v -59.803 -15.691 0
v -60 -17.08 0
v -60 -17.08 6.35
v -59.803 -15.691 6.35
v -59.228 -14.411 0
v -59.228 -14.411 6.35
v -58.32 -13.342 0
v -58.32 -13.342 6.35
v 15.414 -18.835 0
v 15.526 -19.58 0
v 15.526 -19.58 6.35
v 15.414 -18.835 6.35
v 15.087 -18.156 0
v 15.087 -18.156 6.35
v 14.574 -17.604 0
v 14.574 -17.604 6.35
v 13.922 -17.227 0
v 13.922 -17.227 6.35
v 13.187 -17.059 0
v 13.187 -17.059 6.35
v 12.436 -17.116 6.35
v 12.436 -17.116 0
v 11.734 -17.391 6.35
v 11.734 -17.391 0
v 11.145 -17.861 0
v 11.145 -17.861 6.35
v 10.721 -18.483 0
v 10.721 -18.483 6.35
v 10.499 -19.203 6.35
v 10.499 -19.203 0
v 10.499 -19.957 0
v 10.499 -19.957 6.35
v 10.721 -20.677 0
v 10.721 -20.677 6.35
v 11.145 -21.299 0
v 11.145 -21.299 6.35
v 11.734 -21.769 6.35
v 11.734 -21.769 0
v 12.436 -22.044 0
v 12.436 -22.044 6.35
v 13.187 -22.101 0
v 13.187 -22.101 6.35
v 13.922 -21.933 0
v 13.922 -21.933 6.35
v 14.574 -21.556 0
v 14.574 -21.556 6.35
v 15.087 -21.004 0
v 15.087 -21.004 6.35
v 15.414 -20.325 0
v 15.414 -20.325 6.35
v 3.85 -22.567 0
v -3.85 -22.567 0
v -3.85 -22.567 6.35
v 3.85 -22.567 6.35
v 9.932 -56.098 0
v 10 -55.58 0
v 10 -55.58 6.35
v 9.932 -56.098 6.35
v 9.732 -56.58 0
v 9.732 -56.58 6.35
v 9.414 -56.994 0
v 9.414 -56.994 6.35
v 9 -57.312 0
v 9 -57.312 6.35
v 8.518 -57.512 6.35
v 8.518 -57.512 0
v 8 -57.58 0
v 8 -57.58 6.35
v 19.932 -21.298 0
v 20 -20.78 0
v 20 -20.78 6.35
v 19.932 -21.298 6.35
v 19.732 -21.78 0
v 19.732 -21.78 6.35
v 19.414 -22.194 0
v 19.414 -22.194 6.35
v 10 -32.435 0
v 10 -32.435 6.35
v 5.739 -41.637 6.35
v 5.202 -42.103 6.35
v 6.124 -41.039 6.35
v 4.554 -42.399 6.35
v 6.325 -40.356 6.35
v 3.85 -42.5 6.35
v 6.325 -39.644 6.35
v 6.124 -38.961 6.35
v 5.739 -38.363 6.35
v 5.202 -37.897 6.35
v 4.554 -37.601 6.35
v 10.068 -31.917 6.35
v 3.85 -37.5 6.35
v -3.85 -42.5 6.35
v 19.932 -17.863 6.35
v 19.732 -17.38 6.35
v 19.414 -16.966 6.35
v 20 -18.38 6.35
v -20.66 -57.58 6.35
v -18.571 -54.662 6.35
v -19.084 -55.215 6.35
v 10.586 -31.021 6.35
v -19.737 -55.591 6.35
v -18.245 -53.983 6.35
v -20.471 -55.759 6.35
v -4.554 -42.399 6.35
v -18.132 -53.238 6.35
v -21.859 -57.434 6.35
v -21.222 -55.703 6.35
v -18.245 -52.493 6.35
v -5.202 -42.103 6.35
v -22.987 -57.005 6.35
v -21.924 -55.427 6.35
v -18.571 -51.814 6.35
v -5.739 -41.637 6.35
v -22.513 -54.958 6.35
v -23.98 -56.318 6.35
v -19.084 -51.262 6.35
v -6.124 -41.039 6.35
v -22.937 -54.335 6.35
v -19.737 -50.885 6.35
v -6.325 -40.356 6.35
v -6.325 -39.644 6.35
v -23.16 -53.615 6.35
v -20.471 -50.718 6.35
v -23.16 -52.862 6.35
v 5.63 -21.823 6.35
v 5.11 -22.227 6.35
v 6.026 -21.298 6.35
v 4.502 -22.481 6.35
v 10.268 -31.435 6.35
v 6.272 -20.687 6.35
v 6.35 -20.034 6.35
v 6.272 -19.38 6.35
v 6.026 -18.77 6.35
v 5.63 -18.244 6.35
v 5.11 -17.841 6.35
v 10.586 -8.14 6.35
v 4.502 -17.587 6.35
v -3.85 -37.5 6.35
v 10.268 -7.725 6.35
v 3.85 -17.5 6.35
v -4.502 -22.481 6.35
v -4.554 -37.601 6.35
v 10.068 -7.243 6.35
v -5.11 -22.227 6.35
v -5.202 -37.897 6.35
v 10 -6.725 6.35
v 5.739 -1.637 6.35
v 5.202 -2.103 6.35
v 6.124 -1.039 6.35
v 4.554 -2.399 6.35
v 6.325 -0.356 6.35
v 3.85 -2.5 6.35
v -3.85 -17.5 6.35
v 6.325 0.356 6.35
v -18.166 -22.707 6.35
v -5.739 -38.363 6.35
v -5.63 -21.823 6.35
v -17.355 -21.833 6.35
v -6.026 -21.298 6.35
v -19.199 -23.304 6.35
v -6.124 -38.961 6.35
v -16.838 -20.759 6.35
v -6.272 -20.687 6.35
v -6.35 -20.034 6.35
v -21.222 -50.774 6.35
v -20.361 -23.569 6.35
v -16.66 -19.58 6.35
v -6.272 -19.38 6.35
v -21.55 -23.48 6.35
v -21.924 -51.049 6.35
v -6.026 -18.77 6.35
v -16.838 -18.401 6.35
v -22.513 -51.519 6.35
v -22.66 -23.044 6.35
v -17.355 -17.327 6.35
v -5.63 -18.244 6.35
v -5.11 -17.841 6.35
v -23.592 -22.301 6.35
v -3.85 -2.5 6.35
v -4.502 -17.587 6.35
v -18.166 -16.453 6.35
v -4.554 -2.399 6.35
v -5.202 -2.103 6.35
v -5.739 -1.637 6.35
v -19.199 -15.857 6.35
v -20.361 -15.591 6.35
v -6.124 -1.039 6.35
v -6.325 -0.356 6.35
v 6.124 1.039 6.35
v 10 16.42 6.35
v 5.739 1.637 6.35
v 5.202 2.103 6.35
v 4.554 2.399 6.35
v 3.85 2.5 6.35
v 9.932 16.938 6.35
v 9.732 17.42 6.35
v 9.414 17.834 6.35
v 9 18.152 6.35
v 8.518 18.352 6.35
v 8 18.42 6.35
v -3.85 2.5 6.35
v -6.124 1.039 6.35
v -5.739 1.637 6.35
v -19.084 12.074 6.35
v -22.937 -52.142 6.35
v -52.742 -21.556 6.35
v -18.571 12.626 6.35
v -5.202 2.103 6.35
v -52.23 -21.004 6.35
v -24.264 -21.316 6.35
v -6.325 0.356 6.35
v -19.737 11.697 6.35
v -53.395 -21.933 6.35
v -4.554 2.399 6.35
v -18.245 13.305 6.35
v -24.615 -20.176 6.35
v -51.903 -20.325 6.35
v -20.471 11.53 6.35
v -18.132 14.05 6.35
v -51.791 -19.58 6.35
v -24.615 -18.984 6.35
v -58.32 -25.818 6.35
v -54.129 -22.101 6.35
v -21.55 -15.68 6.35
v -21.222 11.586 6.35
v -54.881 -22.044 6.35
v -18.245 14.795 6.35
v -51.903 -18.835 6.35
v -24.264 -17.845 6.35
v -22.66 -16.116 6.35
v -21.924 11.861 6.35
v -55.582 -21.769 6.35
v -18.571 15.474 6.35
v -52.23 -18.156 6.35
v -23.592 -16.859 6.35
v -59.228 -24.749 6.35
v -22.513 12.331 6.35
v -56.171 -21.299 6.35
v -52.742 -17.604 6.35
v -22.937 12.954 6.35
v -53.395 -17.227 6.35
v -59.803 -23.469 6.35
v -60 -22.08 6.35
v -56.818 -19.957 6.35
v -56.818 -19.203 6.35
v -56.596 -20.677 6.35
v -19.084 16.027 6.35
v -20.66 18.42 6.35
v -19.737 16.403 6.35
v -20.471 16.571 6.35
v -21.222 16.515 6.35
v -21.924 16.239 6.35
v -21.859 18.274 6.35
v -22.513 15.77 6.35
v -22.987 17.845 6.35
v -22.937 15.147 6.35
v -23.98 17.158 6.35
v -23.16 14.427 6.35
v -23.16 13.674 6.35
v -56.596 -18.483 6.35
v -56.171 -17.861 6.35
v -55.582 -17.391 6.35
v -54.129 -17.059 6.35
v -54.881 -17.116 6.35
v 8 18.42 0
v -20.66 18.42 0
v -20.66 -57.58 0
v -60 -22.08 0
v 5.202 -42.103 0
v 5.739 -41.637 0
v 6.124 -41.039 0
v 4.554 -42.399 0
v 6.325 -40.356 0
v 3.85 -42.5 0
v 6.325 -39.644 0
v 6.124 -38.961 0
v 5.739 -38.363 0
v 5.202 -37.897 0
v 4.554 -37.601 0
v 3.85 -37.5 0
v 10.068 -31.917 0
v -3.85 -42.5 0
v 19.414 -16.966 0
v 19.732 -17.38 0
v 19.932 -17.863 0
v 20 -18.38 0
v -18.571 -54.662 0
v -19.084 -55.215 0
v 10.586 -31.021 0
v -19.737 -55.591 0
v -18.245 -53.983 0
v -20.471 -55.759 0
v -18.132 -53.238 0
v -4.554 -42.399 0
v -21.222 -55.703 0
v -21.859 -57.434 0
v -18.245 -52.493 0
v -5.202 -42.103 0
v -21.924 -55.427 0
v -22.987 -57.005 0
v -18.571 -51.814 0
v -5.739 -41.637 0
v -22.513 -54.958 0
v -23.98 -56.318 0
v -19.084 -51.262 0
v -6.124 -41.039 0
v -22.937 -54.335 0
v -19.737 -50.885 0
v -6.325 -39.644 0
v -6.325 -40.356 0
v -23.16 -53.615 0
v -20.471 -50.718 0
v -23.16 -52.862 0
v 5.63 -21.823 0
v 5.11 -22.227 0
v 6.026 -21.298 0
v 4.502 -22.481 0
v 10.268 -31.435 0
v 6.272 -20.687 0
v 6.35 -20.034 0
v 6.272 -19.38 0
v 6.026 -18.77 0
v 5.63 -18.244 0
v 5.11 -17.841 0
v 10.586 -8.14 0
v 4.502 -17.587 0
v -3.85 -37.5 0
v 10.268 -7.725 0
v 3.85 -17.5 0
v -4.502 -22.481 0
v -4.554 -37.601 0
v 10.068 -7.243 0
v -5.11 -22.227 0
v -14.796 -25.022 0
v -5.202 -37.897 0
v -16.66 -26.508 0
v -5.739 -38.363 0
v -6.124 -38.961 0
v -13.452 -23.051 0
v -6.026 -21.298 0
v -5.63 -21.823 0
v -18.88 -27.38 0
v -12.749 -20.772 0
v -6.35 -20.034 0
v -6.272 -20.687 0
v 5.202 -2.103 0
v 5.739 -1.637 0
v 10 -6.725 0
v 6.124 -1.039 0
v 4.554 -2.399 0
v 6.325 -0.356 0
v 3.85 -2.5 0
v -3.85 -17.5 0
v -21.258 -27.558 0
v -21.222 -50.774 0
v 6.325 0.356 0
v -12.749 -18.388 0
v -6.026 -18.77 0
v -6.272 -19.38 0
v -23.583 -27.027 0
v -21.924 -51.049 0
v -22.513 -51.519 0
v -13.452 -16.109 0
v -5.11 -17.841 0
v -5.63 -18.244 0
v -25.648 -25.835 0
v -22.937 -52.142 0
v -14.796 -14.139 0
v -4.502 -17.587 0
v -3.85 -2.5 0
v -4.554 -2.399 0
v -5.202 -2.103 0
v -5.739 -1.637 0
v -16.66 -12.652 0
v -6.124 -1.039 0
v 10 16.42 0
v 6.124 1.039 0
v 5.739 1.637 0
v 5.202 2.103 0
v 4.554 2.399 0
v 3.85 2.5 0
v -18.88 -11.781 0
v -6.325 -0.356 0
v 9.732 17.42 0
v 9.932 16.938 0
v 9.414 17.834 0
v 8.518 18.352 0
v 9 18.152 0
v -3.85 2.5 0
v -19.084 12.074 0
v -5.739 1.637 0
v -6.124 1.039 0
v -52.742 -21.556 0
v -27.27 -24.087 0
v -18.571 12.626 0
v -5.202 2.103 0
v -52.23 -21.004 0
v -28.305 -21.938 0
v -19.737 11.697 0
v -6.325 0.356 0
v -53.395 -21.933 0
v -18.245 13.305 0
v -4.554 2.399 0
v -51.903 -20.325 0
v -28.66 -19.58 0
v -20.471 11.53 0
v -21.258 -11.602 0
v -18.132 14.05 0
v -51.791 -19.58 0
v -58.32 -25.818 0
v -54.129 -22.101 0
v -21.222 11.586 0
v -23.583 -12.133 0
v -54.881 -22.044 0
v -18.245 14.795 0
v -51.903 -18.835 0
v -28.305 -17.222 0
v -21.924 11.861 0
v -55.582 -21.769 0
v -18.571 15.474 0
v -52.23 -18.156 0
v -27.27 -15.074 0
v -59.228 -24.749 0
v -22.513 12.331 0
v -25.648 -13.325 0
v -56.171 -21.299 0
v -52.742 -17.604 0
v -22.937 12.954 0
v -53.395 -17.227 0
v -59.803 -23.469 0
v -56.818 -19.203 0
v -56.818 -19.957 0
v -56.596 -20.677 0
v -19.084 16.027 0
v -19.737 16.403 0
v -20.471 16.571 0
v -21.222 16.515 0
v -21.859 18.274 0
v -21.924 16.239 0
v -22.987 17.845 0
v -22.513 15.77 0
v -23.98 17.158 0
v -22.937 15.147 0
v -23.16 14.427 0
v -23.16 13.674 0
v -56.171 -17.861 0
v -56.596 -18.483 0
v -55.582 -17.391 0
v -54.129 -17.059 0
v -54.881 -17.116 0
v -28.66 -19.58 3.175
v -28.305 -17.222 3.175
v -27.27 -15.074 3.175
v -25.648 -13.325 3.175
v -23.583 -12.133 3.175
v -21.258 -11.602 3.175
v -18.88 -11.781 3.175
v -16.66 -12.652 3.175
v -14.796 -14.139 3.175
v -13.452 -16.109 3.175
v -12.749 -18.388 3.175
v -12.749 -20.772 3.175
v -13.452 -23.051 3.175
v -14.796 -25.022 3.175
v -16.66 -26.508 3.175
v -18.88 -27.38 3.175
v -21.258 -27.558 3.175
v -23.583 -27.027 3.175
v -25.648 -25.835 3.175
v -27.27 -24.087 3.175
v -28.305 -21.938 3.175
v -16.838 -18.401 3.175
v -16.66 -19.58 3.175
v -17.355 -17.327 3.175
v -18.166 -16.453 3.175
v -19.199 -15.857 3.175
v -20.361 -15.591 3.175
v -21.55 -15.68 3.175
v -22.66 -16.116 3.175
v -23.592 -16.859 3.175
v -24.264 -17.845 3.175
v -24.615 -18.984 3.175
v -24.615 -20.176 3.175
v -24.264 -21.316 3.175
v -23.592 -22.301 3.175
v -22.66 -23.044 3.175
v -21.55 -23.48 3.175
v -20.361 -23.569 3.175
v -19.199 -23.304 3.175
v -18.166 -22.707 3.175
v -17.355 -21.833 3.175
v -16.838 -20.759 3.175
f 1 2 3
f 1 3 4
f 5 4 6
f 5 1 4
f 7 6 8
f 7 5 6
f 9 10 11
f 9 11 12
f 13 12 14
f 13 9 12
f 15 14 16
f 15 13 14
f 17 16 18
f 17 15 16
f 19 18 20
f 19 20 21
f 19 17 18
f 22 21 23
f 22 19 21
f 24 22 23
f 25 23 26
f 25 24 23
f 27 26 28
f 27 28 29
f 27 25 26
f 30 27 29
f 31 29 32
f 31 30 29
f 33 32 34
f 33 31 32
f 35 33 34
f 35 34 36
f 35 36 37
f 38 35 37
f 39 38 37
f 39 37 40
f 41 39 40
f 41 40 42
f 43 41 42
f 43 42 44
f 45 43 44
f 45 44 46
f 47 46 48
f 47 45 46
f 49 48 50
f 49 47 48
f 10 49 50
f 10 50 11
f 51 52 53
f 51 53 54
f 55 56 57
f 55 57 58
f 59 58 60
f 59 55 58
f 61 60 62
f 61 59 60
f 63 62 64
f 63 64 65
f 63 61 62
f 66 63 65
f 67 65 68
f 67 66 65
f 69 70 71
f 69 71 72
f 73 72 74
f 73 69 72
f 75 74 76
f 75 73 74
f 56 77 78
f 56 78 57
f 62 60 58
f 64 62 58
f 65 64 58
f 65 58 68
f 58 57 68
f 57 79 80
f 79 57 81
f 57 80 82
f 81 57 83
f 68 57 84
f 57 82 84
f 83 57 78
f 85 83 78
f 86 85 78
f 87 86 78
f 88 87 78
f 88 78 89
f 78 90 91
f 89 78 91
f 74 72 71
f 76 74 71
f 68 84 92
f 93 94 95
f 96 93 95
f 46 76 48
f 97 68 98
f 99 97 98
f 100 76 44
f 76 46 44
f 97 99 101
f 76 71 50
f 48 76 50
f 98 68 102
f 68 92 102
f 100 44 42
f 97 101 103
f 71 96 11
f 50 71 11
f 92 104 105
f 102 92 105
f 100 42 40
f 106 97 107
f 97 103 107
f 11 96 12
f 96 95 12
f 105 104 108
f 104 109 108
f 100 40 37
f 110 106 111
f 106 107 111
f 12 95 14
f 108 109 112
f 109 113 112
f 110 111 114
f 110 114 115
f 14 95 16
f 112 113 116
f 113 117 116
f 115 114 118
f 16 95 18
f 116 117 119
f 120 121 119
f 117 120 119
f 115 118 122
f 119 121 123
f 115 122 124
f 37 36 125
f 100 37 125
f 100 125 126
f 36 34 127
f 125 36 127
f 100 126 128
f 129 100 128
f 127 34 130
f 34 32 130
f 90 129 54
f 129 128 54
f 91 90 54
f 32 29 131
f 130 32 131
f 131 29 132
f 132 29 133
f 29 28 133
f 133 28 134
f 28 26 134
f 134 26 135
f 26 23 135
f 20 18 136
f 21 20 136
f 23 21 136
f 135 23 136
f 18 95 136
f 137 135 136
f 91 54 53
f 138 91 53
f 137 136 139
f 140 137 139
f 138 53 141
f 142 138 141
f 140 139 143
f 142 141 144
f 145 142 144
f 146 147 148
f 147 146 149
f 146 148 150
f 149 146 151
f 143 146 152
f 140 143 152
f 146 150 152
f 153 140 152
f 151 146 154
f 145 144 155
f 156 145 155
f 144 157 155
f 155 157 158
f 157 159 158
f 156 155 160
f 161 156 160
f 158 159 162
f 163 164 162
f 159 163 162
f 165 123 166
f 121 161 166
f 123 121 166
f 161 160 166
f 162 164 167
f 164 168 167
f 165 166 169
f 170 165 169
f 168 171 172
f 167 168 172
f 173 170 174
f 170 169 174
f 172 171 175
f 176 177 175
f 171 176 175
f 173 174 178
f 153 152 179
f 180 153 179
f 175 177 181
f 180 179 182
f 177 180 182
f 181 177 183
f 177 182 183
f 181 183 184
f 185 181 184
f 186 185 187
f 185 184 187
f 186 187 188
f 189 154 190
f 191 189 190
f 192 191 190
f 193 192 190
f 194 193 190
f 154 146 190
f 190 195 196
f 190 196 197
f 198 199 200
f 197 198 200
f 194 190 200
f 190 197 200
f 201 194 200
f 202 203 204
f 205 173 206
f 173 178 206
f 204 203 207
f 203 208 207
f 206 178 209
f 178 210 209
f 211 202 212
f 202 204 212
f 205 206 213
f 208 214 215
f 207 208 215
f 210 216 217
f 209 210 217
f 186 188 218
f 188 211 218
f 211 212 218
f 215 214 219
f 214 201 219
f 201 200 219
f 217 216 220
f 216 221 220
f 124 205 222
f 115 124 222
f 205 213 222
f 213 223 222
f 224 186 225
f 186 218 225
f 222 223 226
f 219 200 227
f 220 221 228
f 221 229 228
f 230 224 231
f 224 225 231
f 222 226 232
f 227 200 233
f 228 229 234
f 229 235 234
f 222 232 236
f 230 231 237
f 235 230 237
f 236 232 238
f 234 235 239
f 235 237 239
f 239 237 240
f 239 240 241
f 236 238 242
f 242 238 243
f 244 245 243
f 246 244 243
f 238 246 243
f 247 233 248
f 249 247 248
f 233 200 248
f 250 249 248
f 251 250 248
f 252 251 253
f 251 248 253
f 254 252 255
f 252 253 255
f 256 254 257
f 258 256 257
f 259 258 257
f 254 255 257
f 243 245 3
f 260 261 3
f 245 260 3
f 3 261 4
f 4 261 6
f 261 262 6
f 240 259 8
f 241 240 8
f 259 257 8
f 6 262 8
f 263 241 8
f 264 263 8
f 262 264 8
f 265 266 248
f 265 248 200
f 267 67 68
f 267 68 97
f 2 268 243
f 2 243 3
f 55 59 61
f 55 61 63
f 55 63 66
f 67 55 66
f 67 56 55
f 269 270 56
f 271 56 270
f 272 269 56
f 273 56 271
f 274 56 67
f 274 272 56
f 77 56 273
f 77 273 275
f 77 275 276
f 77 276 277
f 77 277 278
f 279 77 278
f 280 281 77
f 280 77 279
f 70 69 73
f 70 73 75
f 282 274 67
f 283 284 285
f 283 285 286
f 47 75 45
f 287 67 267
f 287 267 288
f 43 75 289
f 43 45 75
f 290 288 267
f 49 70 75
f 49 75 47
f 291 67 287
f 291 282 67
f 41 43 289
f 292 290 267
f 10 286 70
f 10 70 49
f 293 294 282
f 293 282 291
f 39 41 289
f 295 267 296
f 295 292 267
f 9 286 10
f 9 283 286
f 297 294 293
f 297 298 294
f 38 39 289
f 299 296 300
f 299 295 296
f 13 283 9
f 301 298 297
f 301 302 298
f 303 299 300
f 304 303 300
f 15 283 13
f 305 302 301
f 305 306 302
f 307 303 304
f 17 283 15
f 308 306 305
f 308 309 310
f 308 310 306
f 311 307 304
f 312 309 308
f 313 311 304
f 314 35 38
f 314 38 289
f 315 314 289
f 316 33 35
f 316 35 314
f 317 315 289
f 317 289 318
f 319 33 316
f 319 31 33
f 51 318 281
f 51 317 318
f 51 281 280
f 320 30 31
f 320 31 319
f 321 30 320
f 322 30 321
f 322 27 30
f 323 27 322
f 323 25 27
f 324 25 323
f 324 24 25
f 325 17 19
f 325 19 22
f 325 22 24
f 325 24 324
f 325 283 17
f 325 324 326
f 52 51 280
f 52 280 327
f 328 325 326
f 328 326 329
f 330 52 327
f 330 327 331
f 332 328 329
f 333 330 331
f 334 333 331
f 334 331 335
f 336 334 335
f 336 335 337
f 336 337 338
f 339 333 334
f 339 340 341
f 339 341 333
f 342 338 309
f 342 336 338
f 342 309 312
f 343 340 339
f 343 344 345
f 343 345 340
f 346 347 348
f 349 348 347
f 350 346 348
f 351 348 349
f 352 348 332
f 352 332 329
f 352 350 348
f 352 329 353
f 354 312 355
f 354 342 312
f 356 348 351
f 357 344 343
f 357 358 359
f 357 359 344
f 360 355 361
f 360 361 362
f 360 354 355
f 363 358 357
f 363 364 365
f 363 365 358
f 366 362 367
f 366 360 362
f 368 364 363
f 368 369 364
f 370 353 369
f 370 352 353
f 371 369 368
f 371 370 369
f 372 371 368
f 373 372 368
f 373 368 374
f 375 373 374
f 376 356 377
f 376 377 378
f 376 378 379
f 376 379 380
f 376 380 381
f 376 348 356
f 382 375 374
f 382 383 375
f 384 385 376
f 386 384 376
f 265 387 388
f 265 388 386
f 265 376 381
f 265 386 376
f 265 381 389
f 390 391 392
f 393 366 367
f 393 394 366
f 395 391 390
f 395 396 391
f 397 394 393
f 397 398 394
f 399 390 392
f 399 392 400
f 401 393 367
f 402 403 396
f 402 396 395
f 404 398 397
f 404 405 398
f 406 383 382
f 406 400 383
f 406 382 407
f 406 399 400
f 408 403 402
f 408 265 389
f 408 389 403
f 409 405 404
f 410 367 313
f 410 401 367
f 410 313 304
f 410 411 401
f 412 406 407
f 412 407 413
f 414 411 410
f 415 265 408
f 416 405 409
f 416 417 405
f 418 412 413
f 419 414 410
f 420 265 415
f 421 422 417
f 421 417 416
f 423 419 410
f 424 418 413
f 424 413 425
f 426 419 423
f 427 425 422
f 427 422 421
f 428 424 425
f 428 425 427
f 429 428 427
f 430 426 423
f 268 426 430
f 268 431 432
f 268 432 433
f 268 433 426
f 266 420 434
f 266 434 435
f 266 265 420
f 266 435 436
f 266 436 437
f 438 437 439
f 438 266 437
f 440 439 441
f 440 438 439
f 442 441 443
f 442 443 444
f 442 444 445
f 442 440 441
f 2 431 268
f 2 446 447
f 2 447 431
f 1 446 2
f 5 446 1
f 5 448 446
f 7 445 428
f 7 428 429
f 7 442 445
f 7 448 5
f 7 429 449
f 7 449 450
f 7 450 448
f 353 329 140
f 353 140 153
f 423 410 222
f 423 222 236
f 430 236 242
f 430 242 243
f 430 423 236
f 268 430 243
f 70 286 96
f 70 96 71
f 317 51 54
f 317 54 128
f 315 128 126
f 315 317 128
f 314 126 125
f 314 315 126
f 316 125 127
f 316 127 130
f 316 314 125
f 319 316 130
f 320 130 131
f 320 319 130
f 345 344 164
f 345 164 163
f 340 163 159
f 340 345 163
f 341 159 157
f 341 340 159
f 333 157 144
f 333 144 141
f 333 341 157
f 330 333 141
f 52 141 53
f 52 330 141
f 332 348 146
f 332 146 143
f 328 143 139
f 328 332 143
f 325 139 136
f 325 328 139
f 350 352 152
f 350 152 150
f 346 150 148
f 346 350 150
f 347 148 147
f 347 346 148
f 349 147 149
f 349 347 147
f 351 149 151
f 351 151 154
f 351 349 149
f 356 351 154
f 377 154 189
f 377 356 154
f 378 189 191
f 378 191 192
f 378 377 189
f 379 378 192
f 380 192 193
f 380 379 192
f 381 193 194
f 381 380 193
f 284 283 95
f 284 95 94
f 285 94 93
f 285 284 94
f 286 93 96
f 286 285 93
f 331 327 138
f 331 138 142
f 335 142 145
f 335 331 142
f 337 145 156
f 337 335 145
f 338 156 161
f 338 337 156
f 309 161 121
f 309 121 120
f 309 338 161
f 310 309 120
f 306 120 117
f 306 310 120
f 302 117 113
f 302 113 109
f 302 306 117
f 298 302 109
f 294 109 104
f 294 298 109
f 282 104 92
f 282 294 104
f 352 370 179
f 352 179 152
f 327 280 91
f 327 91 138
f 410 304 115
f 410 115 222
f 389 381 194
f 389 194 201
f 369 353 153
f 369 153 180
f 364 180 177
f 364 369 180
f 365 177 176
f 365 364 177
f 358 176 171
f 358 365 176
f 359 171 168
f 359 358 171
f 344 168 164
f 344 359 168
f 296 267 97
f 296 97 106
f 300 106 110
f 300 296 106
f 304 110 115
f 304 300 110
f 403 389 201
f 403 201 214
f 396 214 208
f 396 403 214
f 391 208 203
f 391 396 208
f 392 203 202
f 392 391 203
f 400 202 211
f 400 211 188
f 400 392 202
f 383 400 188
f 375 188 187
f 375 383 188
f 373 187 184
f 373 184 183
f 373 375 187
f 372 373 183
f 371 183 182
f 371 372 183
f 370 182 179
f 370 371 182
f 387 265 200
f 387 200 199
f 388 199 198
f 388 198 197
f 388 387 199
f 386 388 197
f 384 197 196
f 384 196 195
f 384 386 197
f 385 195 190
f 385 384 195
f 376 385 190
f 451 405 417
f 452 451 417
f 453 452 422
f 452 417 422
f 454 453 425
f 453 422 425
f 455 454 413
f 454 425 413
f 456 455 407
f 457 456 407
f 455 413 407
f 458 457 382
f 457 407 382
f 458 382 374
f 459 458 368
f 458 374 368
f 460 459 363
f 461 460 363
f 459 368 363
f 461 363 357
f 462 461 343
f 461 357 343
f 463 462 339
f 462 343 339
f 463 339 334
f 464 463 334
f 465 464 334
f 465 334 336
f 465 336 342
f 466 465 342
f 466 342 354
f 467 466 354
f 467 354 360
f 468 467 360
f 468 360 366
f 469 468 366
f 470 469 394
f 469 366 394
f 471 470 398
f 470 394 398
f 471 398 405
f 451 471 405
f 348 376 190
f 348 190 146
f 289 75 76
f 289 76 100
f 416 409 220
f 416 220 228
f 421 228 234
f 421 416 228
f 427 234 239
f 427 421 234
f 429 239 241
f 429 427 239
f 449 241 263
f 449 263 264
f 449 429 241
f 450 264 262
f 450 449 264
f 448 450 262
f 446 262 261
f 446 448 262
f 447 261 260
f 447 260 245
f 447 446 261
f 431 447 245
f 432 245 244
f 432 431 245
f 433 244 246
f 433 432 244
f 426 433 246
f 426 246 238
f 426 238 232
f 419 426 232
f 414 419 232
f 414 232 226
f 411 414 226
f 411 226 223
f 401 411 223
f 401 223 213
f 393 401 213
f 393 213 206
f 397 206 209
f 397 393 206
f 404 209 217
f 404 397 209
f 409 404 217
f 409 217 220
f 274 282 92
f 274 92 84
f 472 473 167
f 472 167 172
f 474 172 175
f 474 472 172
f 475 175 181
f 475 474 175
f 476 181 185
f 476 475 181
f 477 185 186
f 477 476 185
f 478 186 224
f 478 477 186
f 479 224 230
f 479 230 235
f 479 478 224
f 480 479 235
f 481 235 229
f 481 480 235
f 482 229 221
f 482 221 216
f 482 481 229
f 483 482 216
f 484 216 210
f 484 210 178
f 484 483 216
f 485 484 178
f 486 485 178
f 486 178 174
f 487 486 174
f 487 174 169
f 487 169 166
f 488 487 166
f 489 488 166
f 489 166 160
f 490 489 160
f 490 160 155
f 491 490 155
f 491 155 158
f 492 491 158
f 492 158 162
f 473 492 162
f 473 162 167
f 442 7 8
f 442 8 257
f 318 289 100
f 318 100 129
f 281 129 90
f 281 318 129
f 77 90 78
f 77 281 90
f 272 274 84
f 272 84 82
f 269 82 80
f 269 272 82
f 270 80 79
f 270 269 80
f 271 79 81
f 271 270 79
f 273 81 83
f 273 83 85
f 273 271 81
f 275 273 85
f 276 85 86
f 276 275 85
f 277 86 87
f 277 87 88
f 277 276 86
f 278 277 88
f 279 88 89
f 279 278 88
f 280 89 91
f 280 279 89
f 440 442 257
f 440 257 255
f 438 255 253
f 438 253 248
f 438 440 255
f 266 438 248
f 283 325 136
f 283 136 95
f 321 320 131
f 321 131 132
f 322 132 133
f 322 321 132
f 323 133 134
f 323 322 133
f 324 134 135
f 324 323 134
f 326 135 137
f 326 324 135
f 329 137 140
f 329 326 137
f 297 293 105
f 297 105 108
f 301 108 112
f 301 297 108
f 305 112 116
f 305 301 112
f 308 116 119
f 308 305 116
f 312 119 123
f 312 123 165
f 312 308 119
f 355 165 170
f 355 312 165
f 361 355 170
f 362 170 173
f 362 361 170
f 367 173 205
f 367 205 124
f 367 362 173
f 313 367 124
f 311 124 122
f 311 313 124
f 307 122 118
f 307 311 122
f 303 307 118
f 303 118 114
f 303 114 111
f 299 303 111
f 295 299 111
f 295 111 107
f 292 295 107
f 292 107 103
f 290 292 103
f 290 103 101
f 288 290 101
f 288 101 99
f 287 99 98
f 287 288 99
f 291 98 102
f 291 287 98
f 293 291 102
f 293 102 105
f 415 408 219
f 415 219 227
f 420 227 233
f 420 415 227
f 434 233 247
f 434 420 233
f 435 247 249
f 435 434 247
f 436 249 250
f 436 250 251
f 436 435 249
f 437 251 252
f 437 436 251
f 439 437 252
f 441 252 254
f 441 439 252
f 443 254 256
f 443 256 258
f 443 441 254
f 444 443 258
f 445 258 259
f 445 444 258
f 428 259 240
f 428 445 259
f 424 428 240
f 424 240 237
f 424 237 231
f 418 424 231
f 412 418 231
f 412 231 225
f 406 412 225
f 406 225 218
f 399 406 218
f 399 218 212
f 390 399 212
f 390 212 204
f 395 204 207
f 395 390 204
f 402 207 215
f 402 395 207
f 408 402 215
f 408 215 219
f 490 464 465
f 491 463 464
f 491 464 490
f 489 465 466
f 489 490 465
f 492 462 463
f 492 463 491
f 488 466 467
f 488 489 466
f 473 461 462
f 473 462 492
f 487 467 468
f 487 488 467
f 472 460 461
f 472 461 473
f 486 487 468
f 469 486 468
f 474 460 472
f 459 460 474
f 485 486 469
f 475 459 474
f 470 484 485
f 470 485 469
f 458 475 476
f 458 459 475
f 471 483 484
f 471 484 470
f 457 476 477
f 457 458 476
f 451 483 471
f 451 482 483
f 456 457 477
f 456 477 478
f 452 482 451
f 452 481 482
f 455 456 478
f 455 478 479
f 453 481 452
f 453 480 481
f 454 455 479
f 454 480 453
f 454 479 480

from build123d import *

# Parameters (mm, degrees)
SKETCH1_R                 = 4
SKETCH1_R_2               = 2.527736539
BOSS_EXTRUDE1_DEPTH       = 6.35
F_5_0MM_DOWEL_SLOT1_DEPTH = 6.35
SKETCH4_R                 = 8
CUT_EXTRUDE1_DEPTH        = 3.175


# Read off the part's stored shape, not the designer's step: Ø5.0mm Dowel Slot1
with BuildPart() as part:
    # Sketch1 → Boss-Extrude1 (new body)
    with BuildSketch(Plane.XY):
        with BuildLine():
            Line((8, -57.58012907), (-20.66, -57.58012907))
            ThreePointArc((-20.66, -57.58012907), (-22.435973202, -57.254090899), (-23.980332383, -56.318496743))
            Line((-23.980332383, -56.318496743), (-58.320332383, -25.818496743))
            ThreePointArc((-58.320332383, -25.818496743), (-59.560792799, -24.12931648), (-60, -22.08012907))
            Line((-60, -22.08012907), (-60, -17.08012907))
            ThreePointArc((-60, -17.08012907), (-59.560792799, -15.03094166), (-58.320332383, -13.341761396))
            Line((-58.320332383, -13.341761396), (-23.980332383, 17.158238604))
            ThreePointArc((-23.980332383, 17.158238604), (-22.435973202, 18.09383276), (-20.66, 18.41987093))
            Line((-20.66, 18.41987093), (8, 18.41987093))
            ThreePointArc((8, 18.41987093), (9.414213562, 17.834084493), (10, 16.41987093))
            Line((10, 16.41987093), (10, -6.725270109))
            ThreePointArc((10, -6.725270109), (10.152279768, -7.490730718), (10.585929943, -8.139627163))
            Line((10.585929943, -8.139627163), (19.414070057, -16.965975896))
            ThreePointArc((19.414070057, -16.965975896), (19.847720232, -17.614872341), (20, -18.38033295))
            Line((20, -18.38033295), (20, -20.77992519))
            ThreePointArc((20, -20.77992519), (19.847720232, -21.545385798), (19.414070057, -22.194282243))
            Line((19.414070057, -22.194282243), (10.585929943, -31.020630977))
            ThreePointArc((10.585929943, -31.020630977), (10.152279768, -31.669527422), (10, -32.43498803))
            Line((10, -32.43498803), (10, -55.58012907))
            ThreePointArc((10, -55.58012907), (9.414213562, -56.994342632), (8, -57.58012907))
        make_face()
        with Locations((-20.66, -19.58012907)):
            Circle(SKETCH1_R, mode=Mode.SUBTRACT)
        with Locations((-54.318282784, -19.58012907)):
            Circle(SKETCH1_R_2, mode=Mode.SUBTRACT)
        with Locations((-20.66, 14.050414337)):
            Circle(SKETCH1_R_2, mode=Mode.SUBTRACT)
        with Locations((12.998282784, -19.58012907)):
            Circle(SKETCH1_R_2, mode=Mode.SUBTRACT)
        with Locations((-20.66, -53.238409212)):
            Circle(SKETCH1_R_2, mode=Mode.SUBTRACT)
    extrude(amount=BOSS_EXTRUDE1_DEPTH)

    # Ø5.0mm Dowel Slot1 outline → Ø5.0mm Dowel Slot1 (cut)
    with BuildSketch(Plane.XY):
        with BuildLine():
            ThreePointArc((3.85, -22.567426083), (5.629646398, -21.823233219), (6.349772676, -20.033713042))
            ThreePointArc((6.349772676, -20.033713042), (5.629646398, -18.244192864), (3.85, -17.5))
            Line((3.85, -17.5), (-3.85, -17.5))
            ThreePointArc((-3.85, -17.5), (-5.629646398, -18.244192864), (-6.349772676, -20.033713042))
            ThreePointArc((-6.349772676, -20.033713042), (-5.629646398, -21.823233219), (-3.85, -22.567426083))
            Line((-3.85, -22.567426083), (3.85, -22.567426083))
        make_face()
        with BuildLine():
            Line((-3.85, -2.5), (3.85, -2.5))
            ThreePointArc((3.85, -2.5), (6.35, 0), (3.85, 2.5))
            Line((3.85, 2.5), (-3.85, 2.5))
            ThreePointArc((-3.85, 2.5), (-6.35, 0), (-3.85, -2.5))
        make_face()
        with BuildLine():
            Line((-3.85, -42.5), (3.85, -42.5))
            ThreePointArc((3.85, -42.5), (6.35, -40), (3.85, -37.5))
            Line((3.85, -37.5), (-3.85, -37.5))
            ThreePointArc((-3.85, -37.5), (-6.35, -40), (-3.85, -42.5))
        make_face()
    extrude(amount=F_5_0MM_DOWEL_SLOT1_DEPTH, mode=Mode.SUBTRACT)

    # Sketch4 → Cut-Extrude1 (cut)
    with BuildSketch(Plane(origin=(0, 0, 0), x_dir=(-1, 0, 0), z_dir=(0, 0, -1))):
        with Locations((20.66, -19.58012907)):
            Circle(SKETCH4_R)
    extrude(amount=-CUT_EXTRUDE1_DEPTH, mode=Mode.SUBTRACT)


solid = part.part
